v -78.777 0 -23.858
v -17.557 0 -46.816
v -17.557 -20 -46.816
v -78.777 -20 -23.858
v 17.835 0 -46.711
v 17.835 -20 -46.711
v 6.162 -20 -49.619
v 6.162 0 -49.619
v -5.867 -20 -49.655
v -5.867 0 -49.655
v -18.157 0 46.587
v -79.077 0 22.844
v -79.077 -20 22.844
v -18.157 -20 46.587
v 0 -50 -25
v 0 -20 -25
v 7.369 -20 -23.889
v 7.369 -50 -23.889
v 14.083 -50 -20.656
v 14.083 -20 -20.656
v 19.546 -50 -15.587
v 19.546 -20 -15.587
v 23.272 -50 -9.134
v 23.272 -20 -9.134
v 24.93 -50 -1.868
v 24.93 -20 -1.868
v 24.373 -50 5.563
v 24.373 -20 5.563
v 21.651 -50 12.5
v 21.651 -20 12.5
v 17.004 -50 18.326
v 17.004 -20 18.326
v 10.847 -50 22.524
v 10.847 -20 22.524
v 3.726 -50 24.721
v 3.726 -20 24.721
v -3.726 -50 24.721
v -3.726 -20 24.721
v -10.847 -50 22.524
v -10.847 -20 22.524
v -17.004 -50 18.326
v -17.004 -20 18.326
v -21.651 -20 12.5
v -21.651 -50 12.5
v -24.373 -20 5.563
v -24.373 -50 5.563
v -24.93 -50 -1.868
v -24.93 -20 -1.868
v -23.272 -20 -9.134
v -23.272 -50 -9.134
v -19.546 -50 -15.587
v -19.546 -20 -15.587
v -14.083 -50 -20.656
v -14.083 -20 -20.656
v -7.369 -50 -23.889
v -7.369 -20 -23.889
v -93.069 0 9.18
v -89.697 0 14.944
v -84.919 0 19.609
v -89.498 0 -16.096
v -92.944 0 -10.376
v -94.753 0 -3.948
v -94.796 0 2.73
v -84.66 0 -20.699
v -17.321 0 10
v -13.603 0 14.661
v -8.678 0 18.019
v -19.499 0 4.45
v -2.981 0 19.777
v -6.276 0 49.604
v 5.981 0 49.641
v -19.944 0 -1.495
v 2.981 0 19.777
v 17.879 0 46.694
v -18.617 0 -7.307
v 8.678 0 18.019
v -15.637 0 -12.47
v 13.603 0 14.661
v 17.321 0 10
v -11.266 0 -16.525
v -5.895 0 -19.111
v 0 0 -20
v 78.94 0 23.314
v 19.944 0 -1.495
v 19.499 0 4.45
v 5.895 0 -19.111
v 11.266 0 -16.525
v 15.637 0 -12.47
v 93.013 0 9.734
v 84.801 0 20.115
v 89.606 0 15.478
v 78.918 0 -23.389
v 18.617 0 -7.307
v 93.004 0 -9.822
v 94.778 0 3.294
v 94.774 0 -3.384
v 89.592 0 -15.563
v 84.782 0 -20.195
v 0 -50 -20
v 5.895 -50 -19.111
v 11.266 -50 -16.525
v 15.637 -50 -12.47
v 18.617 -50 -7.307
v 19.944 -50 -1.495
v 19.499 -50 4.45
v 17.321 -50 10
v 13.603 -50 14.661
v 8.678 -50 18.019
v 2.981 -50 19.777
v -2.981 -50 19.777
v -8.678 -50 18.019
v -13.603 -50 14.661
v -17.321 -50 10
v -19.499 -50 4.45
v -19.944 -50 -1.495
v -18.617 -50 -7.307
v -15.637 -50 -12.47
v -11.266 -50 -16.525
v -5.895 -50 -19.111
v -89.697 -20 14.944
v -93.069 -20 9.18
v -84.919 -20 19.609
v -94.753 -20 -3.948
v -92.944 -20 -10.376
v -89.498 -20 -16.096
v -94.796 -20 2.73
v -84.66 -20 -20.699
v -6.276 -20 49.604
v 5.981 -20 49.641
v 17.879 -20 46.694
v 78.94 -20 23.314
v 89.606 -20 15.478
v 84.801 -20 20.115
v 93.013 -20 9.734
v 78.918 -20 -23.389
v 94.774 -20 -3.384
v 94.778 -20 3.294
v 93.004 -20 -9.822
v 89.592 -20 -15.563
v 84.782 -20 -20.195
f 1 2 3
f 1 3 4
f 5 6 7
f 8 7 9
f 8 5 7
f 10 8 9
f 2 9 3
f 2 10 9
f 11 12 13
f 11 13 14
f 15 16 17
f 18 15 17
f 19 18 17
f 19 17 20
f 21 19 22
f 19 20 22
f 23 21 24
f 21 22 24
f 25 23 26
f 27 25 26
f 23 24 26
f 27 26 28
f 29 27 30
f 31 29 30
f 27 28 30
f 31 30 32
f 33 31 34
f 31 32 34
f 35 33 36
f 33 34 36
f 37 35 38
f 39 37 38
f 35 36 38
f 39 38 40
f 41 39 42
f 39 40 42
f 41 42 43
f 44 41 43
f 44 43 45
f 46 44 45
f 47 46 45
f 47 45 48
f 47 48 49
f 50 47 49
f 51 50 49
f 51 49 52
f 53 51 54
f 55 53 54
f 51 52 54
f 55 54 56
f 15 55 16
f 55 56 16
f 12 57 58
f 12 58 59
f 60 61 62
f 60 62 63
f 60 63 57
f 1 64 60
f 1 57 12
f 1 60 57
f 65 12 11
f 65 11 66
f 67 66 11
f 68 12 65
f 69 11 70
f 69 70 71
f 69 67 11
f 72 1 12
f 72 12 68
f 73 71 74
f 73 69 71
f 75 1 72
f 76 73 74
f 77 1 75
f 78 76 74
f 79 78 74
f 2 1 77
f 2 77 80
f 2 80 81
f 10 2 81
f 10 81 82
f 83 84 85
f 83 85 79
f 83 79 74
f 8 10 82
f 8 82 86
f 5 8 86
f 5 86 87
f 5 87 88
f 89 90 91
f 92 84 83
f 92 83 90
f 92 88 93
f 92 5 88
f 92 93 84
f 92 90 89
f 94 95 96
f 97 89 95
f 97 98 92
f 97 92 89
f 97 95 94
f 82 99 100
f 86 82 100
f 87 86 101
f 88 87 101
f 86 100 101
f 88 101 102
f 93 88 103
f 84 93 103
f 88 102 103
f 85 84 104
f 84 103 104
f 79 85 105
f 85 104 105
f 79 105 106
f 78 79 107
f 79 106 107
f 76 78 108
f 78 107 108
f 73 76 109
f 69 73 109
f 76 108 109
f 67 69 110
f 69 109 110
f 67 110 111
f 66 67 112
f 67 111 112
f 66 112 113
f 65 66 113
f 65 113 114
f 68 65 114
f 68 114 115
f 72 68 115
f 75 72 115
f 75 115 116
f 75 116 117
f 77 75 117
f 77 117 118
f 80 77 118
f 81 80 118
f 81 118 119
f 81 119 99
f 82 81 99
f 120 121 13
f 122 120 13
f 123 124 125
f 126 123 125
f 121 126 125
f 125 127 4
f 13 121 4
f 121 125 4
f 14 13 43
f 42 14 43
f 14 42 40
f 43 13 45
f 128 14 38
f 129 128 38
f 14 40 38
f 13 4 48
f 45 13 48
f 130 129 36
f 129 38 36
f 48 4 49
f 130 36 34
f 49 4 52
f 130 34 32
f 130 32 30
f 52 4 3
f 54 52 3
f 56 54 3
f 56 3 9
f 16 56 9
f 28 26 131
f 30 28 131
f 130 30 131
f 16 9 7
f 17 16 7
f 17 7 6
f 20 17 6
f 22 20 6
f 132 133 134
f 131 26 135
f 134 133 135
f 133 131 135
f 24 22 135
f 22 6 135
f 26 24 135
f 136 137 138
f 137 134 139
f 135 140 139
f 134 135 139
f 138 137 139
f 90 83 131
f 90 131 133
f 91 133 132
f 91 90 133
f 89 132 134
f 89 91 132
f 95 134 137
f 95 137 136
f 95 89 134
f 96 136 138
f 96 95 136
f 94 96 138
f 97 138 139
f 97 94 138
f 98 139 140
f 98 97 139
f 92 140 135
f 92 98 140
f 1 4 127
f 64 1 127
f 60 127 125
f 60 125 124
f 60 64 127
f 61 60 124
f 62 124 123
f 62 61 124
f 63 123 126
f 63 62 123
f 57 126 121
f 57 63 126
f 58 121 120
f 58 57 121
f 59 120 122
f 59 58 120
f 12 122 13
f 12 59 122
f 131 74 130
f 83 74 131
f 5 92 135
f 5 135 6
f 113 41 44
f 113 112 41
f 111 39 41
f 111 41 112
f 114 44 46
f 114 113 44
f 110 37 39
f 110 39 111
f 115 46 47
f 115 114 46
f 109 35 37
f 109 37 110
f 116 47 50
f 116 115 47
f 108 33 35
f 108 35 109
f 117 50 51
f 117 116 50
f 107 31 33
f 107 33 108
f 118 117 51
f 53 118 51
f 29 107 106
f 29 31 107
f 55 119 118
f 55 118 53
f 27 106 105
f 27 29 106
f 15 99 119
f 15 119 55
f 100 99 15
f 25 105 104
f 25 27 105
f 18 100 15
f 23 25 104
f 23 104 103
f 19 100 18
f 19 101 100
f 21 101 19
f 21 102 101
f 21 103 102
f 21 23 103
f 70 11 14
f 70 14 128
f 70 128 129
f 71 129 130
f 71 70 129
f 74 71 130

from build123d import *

# Parameters (mm, degrees)
EXTRUDE_419_DEPTH   = 20
SKETCH1_R           = 25
BOSS_EXTRUDE1_DEPTH = 30
SKETCH2_R           = 20
CUT_EXTRUDE1_DEPTH  = 119.427186528


with BuildPart() as part:
    # Эскиз1 → Extrude 419 (new body)
    with BuildSketch(Plane(origin=(0, 0, 0), x_dir=(-1, 0, 0), z_dir=(0, -1, 0))):
        with BuildLine():
            Line((-78.917505692, 23.388614652), (-17.835027079, 46.710938859))
            ThreePointArc((-17.835027079, 46.710938859), (-0.148812417, 49.999778548), (17.556665634, 46.816273793))
            Line((17.556665634, 46.816273793), (78.776887546, 23.857954408))
            ThreePointArc((78.776887546, 23.857954408), (94.998038561, 0.610466623), (79.076996078, -22.84357002))
            Line((79.076996078, -22.84357002), (18.156882698, -46.586775062))
            ThreePointArc((18.156882698, -46.586775062), (0.148812417, -49.999778548), (-17.879254632, -46.694028031))
            Line((-17.879254632, -46.694028031), (-78.939619469, -23.313868793))
            ThreePointArc((-78.939619469, -23.313868793), (-94.99998935, 0.044982802), (-78.917505692, 23.388614652))
        make_face()
    extrude(amount=EXTRUDE_419_DEPTH)

    # Sketch1 → Boss-Extrude1 (add)
    with BuildSketch(Plane.XZ.offset(20)):
        with Locations(Location((0, 0, 0), (0, 0, 270))):
            Circle(SKETCH1_R)
    extrude(amount=BOSS_EXTRUDE1_DEPTH)

    # Sketch2 → Cut-Extrude1 (cut, through all)
    with BuildSketch(Plane.XZ.offset(50)):
        with Locations(Location((0, 0, 0), (0, 0, 270))):
            Circle(SKETCH2_R)
    extrude(amount=-CUT_EXTRUDE1_DEPTH, mode=Mode.SUBTRACT)


solid = part.part
